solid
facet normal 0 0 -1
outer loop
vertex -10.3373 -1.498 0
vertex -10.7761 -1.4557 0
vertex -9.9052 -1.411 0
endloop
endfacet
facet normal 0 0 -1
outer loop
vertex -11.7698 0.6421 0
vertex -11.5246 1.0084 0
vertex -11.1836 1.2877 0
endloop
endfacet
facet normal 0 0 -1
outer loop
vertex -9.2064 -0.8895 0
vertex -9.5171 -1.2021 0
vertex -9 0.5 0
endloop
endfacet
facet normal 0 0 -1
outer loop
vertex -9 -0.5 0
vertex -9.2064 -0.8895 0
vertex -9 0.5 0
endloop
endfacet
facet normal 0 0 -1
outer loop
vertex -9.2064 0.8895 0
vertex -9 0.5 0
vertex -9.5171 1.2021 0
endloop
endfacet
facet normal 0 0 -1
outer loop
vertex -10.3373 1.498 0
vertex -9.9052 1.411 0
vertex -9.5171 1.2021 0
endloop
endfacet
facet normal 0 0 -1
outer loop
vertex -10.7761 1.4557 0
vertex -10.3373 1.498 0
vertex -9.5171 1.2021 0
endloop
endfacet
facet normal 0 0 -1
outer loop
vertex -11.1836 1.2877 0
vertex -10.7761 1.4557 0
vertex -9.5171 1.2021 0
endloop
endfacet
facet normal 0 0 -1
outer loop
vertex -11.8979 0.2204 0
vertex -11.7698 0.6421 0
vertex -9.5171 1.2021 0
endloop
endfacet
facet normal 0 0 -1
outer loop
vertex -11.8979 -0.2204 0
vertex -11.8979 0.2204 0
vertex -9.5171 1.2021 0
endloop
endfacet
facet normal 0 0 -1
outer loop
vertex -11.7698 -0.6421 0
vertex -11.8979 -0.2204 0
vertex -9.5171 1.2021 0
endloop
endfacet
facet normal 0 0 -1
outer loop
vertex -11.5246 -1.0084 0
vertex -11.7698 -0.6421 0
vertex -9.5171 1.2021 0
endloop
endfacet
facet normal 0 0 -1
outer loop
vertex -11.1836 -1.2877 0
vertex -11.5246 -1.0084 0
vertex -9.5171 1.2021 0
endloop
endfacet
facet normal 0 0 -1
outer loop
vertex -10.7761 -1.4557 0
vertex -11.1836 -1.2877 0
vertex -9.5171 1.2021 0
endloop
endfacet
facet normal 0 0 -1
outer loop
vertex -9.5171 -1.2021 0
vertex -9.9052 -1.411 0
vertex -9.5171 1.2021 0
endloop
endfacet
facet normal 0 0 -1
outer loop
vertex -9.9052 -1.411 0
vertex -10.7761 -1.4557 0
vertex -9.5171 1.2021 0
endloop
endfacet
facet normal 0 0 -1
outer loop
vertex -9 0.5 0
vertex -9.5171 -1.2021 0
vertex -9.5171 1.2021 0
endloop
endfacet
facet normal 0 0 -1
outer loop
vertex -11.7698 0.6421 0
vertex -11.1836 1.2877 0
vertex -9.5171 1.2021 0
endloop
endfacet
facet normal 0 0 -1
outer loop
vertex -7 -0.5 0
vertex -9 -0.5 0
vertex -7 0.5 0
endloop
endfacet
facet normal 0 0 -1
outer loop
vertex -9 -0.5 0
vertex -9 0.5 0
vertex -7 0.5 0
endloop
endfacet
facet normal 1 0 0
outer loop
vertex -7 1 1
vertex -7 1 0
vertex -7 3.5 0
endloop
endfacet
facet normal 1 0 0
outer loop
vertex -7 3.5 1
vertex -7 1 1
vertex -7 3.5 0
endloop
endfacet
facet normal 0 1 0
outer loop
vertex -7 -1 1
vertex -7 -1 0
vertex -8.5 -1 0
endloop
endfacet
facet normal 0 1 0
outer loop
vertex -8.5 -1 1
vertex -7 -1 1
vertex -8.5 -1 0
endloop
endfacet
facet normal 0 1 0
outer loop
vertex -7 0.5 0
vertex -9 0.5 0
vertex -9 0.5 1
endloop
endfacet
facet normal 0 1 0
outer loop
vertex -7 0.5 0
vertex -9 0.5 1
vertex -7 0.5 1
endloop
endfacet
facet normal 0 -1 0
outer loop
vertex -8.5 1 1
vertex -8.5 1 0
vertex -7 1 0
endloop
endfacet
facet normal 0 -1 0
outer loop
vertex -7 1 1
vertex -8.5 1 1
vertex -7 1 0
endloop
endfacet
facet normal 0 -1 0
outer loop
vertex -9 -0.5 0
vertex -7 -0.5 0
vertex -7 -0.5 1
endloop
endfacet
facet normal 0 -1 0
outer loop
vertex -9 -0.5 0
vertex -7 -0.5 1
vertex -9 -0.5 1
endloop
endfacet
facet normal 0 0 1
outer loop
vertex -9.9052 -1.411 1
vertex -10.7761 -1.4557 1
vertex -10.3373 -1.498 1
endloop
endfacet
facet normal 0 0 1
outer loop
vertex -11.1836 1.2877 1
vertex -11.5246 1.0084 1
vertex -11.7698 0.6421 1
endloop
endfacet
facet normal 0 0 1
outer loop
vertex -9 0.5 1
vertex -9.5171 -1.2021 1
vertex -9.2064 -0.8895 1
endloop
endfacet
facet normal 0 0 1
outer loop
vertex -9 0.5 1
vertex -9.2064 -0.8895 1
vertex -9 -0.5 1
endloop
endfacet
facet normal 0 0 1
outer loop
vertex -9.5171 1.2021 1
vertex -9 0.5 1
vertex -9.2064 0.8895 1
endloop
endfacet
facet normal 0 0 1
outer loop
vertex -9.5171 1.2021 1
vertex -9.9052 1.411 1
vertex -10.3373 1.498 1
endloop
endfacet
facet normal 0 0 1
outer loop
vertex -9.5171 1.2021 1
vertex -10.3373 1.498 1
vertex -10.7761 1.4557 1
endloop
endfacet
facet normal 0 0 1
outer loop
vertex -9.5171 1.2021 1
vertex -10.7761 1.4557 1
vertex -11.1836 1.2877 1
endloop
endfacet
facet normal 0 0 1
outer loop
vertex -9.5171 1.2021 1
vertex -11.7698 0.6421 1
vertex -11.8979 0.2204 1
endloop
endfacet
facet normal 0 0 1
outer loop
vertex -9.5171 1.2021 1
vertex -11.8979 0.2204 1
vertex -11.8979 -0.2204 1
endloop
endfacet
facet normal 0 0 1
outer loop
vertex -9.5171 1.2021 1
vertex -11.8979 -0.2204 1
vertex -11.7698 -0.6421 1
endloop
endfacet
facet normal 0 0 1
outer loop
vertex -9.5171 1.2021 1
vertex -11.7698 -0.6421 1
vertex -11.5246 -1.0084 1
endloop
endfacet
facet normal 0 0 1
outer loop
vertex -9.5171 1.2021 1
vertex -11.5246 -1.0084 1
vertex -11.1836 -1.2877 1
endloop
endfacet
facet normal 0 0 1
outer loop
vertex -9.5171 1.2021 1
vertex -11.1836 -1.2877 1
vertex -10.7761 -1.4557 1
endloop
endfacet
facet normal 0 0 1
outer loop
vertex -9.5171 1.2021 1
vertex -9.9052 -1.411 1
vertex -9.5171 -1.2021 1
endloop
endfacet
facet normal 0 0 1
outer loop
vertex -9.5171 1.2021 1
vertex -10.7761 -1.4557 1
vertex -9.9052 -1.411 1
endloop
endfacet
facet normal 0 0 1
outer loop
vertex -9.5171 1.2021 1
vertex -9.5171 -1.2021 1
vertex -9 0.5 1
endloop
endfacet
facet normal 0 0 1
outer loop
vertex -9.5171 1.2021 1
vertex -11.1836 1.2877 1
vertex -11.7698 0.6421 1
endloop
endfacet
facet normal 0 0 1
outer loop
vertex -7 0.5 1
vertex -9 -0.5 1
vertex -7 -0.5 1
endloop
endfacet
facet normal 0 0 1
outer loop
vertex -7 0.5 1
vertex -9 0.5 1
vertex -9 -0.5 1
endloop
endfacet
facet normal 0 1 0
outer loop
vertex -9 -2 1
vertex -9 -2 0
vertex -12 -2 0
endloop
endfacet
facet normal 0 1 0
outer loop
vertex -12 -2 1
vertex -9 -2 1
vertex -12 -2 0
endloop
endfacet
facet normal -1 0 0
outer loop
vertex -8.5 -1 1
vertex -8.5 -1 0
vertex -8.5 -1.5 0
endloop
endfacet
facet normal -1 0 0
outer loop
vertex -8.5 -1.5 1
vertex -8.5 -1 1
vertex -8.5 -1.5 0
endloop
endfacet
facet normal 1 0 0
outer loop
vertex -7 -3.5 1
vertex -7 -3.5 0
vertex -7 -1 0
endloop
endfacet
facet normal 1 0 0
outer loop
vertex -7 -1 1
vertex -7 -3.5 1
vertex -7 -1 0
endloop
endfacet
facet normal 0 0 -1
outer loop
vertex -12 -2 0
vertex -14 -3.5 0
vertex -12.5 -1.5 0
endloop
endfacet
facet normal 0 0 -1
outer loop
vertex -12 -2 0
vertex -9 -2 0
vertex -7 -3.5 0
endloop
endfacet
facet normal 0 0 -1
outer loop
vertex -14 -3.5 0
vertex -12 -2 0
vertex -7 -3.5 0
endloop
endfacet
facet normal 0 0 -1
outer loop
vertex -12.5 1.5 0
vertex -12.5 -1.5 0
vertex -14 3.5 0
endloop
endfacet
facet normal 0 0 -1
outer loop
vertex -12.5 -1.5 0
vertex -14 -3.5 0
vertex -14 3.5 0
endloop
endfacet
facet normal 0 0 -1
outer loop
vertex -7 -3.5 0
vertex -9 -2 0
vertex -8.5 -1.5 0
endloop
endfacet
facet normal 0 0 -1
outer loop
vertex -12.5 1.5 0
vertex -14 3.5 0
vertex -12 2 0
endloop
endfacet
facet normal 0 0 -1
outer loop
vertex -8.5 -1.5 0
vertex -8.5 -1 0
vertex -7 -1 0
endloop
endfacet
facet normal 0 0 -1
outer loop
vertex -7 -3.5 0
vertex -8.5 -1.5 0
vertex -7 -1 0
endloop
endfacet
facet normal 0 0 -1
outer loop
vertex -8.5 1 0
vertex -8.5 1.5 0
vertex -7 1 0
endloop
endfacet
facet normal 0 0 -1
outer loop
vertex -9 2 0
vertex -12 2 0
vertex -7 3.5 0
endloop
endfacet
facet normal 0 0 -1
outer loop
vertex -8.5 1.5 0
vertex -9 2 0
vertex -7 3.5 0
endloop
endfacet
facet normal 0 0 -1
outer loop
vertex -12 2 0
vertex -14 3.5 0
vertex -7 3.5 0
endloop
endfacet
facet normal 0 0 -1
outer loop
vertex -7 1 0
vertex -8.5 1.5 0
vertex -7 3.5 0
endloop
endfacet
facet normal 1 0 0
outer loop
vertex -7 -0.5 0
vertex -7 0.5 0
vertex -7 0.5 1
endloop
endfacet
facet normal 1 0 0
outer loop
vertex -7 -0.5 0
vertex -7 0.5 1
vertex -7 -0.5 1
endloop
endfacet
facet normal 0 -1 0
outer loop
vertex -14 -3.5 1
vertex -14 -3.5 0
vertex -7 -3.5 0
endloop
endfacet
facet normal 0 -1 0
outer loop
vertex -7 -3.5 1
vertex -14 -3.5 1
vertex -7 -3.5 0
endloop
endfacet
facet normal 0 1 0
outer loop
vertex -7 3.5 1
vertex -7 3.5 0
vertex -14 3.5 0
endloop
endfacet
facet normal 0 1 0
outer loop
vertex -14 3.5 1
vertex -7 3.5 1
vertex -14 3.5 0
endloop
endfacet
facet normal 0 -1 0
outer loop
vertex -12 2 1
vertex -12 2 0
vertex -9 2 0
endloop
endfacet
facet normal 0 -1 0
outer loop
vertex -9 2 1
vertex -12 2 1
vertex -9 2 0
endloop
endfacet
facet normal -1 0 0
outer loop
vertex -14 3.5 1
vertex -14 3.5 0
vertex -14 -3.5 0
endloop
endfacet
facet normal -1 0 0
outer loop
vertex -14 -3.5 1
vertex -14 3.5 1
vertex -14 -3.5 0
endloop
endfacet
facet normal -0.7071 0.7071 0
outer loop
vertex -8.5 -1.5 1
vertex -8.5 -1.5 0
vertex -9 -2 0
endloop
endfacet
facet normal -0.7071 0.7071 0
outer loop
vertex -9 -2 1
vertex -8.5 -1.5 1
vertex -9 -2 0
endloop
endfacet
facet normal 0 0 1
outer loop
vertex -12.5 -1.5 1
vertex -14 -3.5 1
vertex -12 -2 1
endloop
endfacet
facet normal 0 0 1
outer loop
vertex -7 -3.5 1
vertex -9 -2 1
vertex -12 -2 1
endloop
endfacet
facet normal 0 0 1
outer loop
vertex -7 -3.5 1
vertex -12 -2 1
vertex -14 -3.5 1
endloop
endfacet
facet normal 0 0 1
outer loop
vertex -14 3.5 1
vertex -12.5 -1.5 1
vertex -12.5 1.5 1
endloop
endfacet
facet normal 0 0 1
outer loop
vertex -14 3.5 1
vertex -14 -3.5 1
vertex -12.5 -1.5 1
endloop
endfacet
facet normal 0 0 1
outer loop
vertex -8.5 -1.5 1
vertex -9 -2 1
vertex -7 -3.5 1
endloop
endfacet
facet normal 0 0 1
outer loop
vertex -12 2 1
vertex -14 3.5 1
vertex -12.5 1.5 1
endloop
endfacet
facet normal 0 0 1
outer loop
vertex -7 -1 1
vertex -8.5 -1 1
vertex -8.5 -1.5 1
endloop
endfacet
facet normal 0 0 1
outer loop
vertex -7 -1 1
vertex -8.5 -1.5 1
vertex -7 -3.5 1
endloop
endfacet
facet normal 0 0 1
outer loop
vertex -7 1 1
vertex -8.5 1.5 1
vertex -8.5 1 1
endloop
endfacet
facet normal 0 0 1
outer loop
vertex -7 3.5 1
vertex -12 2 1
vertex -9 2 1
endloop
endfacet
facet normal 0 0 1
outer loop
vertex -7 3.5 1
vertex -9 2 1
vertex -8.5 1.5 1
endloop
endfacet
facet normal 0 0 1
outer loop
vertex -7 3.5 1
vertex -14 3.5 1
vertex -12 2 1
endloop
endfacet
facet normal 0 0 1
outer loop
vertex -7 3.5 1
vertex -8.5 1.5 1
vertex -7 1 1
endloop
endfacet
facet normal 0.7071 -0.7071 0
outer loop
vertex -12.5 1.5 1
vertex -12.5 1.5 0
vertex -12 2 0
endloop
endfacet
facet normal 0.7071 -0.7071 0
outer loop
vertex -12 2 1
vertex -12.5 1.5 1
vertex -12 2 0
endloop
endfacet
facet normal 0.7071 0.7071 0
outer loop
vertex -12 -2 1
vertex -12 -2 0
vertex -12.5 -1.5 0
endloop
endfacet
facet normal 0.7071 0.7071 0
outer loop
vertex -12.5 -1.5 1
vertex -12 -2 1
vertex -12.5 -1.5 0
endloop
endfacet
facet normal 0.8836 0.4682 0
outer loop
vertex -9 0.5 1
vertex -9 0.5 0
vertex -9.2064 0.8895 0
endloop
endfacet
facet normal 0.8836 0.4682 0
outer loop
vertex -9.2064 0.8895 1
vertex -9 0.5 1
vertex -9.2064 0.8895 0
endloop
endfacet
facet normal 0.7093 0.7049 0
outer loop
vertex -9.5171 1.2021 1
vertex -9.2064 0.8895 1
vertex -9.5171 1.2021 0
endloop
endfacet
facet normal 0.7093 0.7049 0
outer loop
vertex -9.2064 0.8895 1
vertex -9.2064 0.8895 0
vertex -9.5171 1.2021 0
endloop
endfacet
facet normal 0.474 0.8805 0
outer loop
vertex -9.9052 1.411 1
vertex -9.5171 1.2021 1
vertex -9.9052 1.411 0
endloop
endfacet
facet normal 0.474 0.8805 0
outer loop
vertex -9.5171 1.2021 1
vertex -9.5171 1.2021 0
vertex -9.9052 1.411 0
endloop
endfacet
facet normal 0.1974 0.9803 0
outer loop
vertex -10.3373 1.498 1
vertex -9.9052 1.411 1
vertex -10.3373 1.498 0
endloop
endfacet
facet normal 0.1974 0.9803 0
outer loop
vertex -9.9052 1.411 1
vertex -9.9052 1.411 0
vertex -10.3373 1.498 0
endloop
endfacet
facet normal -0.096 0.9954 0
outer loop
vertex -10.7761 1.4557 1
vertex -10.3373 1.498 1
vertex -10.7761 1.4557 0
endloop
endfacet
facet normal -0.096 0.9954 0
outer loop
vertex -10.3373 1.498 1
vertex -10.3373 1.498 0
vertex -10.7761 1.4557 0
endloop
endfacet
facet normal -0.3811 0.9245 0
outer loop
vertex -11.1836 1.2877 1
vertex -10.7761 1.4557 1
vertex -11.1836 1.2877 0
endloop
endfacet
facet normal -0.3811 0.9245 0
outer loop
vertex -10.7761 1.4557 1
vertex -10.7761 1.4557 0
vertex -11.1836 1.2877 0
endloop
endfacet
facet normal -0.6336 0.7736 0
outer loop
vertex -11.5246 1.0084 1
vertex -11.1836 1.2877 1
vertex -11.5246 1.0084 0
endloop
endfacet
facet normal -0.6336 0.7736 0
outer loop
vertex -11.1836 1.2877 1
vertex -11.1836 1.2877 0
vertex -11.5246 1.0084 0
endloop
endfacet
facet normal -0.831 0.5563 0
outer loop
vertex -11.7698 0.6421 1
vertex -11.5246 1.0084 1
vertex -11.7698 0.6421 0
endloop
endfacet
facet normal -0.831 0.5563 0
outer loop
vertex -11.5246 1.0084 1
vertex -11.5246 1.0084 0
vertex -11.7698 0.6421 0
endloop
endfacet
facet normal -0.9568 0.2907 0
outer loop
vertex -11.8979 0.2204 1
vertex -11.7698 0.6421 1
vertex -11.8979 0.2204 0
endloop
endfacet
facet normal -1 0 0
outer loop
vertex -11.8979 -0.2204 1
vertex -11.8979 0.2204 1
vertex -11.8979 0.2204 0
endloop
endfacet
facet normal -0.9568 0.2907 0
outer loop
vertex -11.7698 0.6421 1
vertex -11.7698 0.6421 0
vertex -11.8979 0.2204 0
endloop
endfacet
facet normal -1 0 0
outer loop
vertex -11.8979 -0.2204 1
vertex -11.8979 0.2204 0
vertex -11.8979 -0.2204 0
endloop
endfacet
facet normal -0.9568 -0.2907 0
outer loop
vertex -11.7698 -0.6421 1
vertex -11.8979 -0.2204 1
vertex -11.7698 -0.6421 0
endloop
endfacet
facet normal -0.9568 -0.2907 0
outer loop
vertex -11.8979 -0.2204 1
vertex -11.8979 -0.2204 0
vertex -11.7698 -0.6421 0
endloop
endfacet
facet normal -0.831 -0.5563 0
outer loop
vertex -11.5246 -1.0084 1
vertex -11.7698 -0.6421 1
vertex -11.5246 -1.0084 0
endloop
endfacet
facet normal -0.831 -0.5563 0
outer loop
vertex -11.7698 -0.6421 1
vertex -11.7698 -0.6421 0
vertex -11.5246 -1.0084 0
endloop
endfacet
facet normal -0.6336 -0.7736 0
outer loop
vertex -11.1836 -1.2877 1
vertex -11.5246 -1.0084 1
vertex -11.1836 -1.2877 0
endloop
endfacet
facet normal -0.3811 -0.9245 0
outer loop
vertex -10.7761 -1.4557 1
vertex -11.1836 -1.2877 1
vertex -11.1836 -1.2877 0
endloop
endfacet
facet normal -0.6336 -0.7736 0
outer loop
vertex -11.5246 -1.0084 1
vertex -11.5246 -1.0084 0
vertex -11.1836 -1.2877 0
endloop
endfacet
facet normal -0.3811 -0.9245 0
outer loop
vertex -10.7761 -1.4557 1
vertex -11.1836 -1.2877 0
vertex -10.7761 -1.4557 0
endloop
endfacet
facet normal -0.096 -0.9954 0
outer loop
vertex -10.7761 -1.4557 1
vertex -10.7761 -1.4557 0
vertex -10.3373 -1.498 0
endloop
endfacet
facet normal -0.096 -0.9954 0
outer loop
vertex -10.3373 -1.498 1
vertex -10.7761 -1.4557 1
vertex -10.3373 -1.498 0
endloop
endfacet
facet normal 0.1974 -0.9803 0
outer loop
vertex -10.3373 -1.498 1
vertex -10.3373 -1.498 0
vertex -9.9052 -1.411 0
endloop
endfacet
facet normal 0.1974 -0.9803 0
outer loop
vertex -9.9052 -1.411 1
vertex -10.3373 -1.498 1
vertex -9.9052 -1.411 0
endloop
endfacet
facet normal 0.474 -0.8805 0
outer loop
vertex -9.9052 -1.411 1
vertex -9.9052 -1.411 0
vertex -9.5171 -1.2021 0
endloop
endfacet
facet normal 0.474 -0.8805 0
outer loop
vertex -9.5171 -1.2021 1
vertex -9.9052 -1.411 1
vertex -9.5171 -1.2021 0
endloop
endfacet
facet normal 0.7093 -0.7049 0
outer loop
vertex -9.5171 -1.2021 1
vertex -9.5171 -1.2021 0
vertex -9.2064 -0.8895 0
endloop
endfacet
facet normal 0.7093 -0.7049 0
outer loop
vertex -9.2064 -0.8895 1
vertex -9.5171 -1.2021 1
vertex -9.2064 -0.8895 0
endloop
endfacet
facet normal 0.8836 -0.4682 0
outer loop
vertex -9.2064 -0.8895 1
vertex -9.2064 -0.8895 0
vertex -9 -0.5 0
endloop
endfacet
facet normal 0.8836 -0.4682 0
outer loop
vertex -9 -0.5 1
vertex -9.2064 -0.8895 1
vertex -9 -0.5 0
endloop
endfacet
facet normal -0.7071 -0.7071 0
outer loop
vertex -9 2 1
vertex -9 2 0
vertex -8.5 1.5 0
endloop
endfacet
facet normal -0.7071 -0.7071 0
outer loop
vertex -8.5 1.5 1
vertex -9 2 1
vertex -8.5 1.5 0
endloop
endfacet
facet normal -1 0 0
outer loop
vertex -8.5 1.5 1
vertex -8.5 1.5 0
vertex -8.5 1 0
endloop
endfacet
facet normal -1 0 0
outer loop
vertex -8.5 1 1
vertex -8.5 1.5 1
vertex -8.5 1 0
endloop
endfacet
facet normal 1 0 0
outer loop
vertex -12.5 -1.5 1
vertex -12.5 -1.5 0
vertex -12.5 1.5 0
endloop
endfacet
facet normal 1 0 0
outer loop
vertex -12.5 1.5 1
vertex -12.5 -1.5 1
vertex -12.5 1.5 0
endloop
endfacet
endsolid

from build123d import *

# Parameters (mm, degrees)
PAD001_DEPTH = 1
PAD_DEPTH    = 1


with BuildPart() as outer_pad:
    # Sketch → Pad001 (new body)
    with BuildSketch(Plane.XY):
        Polygon((-8.5, 1), (-7, 1), (-7, 3.5), (-14, 3.5), (-14, -3.5), (-7, -3.5), (-7, -1), (-8.5, -1), (-8.5, -1.5), (-9, -2), (-12, -2), (-12.5, -1.5), (-12.5, 1.5), (-12, 2), (-9, 2), (-8.5, 1.5), align=None)
    extrude(amount=PAD001_DEPTH)


with BuildPart() as inner_pad:
    # Sketch001 → Pad (new body)
    with BuildSketch(Plane.XY):
        with BuildLine():
            ThreePointArc((-9, 0.5), (-11.914214, 0), (-9, -0.5))
            Line((-7, -0.5), (-9, -0.5))
            Line((-7, 0.5), (-7, -0.5))
            Line((-9, 0.5), (-7, 0.5))
        make_face()
    extrude(amount=PAD_DEPTH)


solid = Compound([outer_pad.part, inner_pad.part])
